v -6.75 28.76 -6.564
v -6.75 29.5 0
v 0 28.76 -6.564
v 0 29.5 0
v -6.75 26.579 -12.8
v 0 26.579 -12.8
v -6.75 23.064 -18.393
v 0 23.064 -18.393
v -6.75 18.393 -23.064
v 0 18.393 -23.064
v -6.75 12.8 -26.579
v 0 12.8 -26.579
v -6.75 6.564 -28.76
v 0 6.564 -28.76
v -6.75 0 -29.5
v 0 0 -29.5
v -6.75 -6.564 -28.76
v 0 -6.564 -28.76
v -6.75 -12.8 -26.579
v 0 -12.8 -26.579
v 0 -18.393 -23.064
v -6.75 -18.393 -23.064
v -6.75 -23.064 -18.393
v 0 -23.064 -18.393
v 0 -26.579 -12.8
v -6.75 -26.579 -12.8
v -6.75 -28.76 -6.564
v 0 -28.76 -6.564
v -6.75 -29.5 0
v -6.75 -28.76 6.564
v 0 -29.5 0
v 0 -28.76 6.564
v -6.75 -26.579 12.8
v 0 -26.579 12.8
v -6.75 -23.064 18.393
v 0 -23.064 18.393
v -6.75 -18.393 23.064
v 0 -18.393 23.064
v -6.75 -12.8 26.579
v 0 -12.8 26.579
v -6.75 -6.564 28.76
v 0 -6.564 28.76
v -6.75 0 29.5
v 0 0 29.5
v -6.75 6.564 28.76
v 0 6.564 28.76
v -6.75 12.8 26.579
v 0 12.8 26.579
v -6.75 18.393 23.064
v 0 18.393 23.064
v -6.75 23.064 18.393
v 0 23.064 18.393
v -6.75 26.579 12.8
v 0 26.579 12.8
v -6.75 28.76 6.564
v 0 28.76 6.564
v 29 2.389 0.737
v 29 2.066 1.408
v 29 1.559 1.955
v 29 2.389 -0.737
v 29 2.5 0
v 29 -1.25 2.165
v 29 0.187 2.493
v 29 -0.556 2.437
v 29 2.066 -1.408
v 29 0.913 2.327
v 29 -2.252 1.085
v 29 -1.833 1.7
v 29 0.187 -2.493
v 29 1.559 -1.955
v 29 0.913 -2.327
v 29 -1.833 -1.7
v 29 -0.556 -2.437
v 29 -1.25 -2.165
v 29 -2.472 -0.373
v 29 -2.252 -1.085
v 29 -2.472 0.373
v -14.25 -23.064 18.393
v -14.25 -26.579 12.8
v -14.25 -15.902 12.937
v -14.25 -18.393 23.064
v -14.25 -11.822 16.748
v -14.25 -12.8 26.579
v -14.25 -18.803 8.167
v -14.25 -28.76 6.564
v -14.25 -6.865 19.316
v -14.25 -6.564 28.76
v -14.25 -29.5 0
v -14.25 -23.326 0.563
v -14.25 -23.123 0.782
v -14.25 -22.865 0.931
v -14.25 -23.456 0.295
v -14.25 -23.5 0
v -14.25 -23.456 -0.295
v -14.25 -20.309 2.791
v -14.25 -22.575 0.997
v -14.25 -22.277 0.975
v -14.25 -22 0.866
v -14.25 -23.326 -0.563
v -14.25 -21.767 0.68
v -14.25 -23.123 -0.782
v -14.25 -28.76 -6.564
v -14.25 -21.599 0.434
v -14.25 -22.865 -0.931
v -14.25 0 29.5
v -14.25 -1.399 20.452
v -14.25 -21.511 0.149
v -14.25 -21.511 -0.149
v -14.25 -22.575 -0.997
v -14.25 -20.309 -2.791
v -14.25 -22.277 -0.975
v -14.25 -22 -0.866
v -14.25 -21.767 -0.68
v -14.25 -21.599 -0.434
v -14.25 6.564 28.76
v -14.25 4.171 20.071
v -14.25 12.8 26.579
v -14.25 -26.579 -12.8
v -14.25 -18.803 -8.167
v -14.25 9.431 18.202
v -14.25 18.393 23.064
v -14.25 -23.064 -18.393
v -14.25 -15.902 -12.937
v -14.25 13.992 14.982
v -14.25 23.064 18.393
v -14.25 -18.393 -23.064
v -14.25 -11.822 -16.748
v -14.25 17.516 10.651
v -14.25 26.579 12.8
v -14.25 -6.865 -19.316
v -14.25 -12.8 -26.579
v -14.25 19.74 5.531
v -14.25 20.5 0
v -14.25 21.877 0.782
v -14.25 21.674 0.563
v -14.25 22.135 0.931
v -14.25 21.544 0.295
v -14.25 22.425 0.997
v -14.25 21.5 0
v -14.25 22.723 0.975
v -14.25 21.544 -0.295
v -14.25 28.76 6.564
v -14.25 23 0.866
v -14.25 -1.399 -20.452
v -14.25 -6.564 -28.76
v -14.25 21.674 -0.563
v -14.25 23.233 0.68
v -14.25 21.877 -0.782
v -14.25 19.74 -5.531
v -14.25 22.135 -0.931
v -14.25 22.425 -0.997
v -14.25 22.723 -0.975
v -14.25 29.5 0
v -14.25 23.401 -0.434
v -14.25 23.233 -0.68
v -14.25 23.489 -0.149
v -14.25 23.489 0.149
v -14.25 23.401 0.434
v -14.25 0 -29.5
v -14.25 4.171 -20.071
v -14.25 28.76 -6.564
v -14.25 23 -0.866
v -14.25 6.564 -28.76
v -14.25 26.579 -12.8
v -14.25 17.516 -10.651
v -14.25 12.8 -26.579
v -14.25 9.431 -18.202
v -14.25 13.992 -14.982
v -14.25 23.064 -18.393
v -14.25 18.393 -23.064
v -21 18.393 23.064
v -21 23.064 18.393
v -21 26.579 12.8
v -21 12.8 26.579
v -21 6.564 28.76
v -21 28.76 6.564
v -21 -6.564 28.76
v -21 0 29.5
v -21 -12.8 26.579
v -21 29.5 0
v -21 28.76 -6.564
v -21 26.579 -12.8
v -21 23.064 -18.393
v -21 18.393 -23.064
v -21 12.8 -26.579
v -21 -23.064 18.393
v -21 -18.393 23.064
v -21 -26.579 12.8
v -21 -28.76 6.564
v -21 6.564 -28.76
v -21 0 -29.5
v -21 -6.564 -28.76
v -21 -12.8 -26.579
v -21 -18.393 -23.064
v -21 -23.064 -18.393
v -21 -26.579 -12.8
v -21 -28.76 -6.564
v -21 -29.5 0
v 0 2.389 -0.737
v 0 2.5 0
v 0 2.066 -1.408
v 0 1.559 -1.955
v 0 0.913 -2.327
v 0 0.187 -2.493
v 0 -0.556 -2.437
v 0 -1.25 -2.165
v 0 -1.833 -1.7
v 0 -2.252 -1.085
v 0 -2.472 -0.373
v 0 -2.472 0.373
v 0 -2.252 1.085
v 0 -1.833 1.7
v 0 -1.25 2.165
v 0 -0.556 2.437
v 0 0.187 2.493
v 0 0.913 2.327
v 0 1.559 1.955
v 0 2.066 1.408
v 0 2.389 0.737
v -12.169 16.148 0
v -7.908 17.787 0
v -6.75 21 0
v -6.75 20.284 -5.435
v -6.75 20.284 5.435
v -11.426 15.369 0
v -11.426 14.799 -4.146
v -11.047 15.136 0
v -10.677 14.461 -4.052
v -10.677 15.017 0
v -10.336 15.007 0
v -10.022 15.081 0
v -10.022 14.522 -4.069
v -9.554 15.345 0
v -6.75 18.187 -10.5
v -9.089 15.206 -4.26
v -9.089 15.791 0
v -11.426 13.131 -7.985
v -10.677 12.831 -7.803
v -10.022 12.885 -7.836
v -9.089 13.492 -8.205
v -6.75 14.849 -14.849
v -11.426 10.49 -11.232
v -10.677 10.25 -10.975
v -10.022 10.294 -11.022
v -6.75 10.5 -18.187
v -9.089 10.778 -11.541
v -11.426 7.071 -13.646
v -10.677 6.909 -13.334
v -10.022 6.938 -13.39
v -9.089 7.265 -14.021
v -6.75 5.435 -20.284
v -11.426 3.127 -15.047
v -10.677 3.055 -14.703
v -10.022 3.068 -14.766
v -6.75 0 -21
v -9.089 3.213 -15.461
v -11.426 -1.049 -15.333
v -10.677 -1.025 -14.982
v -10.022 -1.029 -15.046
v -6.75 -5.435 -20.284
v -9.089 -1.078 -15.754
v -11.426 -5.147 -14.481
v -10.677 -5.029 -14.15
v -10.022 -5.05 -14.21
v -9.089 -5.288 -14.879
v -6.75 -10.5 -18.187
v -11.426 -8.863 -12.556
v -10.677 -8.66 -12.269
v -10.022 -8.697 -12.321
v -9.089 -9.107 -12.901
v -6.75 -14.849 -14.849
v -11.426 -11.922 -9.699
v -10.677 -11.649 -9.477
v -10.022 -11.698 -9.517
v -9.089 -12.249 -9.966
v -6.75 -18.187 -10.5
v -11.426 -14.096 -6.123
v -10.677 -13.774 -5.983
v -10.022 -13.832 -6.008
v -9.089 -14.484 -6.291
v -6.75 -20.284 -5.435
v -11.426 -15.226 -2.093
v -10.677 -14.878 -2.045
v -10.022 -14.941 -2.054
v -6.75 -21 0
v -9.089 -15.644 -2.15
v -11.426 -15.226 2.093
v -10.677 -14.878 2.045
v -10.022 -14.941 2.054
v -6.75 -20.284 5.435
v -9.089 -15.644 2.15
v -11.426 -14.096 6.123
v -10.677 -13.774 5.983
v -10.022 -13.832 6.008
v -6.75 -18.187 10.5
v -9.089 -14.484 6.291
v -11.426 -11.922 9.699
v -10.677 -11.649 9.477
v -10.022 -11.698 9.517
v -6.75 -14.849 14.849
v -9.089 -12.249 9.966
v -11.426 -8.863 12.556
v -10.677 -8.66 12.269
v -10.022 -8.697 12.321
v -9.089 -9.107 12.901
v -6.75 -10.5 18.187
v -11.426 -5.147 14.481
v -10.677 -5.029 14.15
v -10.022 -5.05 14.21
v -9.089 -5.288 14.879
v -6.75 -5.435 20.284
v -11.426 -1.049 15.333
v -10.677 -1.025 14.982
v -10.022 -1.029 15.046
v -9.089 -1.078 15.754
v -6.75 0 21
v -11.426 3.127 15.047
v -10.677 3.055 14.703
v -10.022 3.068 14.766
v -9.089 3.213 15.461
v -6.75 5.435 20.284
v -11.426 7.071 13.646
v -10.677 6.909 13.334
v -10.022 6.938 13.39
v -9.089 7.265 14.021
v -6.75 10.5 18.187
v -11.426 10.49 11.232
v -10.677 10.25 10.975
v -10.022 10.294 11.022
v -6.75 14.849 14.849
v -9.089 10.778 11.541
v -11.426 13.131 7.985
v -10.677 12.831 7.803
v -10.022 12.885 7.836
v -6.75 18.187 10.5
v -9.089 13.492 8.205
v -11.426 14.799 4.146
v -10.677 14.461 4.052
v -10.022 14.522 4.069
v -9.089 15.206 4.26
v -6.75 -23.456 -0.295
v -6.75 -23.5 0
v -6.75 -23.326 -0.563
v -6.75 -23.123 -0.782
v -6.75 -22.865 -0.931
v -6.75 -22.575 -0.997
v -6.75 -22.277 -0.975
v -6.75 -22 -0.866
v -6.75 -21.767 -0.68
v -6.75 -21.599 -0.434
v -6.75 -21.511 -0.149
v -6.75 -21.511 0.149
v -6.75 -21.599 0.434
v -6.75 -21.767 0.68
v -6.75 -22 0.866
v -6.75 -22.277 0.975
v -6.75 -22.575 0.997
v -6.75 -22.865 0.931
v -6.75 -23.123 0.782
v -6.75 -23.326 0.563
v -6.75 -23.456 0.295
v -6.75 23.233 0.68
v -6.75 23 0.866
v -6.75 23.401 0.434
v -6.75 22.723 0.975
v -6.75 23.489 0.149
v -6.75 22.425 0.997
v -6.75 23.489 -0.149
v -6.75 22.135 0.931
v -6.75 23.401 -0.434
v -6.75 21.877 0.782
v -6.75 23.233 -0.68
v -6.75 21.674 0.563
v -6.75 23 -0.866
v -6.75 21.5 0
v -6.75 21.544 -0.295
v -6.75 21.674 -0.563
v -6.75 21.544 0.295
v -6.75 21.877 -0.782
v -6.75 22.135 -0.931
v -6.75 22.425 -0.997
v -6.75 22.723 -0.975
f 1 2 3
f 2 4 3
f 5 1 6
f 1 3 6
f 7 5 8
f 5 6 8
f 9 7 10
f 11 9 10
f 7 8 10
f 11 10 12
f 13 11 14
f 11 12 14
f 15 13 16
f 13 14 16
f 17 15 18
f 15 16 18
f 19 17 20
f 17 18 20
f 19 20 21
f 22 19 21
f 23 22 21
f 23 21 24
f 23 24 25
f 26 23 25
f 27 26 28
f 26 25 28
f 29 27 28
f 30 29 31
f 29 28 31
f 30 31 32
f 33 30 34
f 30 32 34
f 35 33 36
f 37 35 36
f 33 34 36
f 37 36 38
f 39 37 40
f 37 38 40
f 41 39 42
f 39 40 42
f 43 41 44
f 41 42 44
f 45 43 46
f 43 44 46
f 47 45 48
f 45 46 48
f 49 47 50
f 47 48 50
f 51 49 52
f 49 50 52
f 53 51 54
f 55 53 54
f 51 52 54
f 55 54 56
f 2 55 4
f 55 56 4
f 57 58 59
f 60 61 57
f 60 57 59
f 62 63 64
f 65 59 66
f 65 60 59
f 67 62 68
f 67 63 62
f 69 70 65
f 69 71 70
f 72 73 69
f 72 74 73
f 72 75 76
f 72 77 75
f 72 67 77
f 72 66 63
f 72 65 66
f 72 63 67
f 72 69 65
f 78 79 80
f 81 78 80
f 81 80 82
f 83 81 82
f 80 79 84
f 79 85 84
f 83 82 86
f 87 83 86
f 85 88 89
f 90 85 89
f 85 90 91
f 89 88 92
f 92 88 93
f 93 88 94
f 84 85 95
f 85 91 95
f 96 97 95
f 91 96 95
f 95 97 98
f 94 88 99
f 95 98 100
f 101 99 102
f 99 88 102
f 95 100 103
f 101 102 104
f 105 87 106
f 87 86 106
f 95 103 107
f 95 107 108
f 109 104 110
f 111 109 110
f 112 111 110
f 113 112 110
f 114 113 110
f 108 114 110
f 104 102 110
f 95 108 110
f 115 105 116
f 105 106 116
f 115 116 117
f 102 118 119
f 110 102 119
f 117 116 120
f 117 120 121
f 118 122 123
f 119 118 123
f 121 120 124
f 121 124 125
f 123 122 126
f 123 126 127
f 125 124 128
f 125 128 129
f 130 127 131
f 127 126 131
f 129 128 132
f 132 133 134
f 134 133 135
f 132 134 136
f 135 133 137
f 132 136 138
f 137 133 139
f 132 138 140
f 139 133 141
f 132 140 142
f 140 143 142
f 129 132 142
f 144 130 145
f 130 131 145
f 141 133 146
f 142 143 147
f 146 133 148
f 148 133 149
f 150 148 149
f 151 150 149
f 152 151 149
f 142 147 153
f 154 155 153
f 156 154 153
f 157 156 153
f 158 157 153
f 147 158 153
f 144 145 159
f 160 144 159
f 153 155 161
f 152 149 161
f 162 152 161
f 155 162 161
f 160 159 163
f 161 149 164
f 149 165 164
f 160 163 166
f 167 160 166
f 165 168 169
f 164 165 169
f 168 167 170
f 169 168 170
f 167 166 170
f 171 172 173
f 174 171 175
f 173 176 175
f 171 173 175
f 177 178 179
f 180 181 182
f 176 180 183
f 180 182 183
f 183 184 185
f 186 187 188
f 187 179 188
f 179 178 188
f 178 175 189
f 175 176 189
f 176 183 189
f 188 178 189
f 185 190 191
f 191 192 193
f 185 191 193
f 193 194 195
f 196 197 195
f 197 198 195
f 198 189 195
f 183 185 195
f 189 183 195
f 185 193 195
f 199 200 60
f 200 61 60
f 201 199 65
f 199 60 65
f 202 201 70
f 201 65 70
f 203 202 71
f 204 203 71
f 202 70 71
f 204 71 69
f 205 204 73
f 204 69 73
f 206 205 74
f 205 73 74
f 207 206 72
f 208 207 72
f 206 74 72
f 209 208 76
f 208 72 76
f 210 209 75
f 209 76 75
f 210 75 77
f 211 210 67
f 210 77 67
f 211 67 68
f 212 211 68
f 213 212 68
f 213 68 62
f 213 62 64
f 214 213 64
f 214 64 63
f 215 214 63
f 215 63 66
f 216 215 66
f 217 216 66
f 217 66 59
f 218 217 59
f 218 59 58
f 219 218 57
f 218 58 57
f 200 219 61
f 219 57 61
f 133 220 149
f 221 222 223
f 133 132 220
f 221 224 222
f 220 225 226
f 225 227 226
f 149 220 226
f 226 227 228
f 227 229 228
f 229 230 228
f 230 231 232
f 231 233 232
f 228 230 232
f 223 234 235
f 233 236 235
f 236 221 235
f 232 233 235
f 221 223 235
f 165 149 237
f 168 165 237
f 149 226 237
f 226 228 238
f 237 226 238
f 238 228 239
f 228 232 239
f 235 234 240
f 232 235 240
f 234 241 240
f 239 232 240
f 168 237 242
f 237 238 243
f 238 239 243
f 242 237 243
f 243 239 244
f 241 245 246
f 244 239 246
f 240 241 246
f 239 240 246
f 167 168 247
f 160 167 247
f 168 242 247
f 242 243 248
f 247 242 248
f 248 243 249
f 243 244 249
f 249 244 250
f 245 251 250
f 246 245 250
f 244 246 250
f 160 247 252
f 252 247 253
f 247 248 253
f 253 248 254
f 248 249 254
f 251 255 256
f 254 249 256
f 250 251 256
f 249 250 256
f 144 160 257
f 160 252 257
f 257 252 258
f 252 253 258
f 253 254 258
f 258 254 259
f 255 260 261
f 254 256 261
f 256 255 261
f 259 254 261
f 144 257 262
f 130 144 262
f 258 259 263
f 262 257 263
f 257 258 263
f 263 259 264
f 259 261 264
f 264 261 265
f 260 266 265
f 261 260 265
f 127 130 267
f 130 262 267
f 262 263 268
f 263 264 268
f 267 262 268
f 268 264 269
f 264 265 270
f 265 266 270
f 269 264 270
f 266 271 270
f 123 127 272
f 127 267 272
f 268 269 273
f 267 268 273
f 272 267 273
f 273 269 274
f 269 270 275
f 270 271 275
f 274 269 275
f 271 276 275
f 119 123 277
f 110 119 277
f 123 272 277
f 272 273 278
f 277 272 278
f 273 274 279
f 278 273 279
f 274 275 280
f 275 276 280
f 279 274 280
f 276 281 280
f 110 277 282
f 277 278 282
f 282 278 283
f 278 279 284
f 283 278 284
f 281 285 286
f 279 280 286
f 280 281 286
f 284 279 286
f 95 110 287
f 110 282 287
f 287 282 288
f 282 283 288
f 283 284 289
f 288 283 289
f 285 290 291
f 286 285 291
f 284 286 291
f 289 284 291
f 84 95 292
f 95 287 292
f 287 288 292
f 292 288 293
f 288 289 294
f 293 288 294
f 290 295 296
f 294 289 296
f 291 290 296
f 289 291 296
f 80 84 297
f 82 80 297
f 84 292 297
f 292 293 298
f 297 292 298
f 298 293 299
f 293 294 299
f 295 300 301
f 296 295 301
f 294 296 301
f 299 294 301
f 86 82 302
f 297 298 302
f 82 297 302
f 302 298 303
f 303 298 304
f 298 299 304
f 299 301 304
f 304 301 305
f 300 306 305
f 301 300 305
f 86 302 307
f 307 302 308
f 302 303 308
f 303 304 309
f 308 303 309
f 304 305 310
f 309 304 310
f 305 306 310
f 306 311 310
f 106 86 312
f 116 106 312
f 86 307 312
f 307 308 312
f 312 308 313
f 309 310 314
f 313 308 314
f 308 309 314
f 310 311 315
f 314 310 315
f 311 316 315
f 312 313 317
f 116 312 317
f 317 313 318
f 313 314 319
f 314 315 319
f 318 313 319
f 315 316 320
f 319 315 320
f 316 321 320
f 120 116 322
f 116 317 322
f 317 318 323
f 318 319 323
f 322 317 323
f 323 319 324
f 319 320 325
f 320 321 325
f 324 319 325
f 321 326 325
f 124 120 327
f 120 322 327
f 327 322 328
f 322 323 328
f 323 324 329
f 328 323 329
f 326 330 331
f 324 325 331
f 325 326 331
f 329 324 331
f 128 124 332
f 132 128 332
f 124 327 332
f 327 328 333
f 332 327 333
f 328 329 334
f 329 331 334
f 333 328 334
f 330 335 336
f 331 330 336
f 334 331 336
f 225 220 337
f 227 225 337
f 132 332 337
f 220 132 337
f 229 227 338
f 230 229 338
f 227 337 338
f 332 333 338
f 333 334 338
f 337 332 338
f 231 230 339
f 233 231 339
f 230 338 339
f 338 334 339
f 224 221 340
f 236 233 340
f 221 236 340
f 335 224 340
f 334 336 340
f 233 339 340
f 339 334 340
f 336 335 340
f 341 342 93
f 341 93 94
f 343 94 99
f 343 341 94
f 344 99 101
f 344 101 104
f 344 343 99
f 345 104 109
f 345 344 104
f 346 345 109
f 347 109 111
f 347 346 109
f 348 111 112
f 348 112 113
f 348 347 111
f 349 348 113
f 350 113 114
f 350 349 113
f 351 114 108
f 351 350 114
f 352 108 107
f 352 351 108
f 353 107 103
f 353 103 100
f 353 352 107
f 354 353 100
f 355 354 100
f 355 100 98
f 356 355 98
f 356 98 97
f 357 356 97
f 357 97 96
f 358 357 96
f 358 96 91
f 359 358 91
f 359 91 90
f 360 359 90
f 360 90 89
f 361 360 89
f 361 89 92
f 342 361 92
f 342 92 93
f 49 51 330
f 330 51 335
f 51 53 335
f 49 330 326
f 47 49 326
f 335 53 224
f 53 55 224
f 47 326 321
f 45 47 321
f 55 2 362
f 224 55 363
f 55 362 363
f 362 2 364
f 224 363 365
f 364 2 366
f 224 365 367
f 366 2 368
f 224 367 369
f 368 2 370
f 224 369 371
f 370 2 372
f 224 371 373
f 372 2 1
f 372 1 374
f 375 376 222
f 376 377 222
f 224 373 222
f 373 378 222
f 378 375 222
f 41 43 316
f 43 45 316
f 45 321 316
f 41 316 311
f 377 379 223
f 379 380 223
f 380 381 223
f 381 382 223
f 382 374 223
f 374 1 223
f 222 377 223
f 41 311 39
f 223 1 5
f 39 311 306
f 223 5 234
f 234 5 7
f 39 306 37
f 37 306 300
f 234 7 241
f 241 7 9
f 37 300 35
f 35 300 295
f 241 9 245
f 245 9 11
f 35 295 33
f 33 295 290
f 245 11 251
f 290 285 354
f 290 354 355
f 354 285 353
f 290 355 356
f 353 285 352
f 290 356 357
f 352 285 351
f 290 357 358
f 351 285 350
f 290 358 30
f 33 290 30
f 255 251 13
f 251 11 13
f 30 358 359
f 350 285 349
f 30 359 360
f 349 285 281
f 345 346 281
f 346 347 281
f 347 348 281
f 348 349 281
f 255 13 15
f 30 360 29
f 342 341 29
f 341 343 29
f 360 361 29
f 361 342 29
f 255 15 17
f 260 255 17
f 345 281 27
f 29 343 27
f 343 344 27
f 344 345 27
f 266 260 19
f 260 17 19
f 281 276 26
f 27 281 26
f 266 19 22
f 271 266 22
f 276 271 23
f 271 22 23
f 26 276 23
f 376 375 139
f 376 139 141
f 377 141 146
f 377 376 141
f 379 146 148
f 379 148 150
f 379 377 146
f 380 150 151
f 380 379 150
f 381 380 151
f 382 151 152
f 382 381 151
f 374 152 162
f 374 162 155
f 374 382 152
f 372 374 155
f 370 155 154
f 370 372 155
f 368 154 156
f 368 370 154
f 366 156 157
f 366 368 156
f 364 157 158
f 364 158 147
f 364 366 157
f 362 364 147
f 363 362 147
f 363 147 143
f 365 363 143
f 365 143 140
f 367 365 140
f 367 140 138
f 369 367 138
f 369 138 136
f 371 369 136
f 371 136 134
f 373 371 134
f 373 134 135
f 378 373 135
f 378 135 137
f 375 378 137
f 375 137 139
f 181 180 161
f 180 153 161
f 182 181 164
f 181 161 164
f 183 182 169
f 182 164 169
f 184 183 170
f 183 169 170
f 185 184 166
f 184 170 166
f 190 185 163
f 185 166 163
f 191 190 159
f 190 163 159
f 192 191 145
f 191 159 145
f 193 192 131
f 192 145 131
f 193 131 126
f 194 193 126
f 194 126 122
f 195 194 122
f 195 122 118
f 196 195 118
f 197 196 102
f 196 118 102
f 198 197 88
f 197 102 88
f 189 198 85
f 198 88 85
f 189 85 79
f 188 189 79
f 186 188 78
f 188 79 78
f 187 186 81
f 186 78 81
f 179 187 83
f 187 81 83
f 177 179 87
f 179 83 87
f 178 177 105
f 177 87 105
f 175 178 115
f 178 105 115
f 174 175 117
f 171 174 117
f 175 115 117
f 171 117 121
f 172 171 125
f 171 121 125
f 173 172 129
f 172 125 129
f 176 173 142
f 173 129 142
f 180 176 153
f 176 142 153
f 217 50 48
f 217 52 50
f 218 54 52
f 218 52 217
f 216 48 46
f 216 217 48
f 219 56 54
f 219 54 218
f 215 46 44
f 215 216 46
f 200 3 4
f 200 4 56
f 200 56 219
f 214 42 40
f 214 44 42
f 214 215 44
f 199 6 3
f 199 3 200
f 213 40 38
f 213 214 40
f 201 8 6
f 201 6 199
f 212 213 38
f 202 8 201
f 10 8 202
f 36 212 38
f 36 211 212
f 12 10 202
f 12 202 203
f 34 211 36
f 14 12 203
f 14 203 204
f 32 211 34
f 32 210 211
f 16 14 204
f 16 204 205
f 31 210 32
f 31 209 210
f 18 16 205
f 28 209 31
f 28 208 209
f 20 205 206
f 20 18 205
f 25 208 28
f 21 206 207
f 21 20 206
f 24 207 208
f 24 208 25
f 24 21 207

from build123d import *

# Parameters (mm, degrees)
SKETCH_1_W      = 29
SKETCH_1_H      = 2.5
SKETCH_2_R      = 1
EXTRUDE_1_DEPTH = 20


with BuildPart() as part:
    # 草图1 → 旋转1 (revolve)
    with BuildSketch(Plane.XY):
        with BuildLine():
            add(Edge.make_bspline(
                [(-14.25, 20.5), (-10.271097928, 9.254557994), (-6.75, 21)],
                knots=[0, 0, 0, 1, 1, 1], degree=2))
            Line((-6.75, 21), (-6.75, 29.5))
            Line((-6.75, 29.5), (0, 29.5))
            Line((0, 29.5), (0, 0))
            Line((0, 0), (-21, 0))
            Line((-21, 0), (-21, 29.5))
            Line((-21, 29.5), (-14.25, 29.5))
            Line((-14.25, 29.5), (-14.25, 20.5))
        make_face()
        with Locations((14.5, 1.25)):
            Rectangle(SKETCH_1_W, SKETCH_1_H)
    revolve(axis=Axis((0, 0, 0), (-1, 0, 0)))

    # 草图2 → 凸台-拉伸1 (add)
    with BuildSketch(Plane(origin=(0, 0, 0), x_dir=(0, 0, -1), z_dir=(1, 0, 0))):
        with Locations(Location((0, 22.5, 0), (0, 0, 270))):
            Circle(SKETCH_2_R)
        with Locations(Location((0, -22.5, 0), (0, 0, 270))):
            Circle(SKETCH_2_R)
    extrude(amount=-EXTRUDE_1_DEPTH)


solid = part.part
